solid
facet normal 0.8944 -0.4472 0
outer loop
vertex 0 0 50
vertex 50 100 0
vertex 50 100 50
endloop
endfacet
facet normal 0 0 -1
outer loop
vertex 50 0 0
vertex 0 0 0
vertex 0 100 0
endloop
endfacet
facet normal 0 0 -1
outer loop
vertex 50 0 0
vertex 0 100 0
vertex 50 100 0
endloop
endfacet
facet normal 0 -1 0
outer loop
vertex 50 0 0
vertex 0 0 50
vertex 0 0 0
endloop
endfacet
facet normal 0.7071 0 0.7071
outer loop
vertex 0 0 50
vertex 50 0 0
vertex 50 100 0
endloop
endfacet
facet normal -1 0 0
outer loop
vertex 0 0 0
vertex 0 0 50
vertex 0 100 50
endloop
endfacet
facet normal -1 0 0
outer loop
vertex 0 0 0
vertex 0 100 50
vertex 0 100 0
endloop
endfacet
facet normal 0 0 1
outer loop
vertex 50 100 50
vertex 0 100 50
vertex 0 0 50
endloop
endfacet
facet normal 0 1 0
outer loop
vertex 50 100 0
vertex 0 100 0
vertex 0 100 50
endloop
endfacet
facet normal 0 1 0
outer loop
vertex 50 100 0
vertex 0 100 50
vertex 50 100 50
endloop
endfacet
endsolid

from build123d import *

# Parameters (mm, degrees)
F1_DEPTH = 100
F3_DEPTH = 50


with BuildPart() as f1:
    # F0 (on Front) → F1 (new body)
    with BuildSketch(Plane.XZ):
        Polygon((0, 50), (0, 0), (50, 0), align=None)
    extrude(amount=-F1_DEPTH)

    # F2 (on face) → F3 (join, through all)
    with BuildSketch(Plane(origin=(0, 0, 0), x_dir=(1, 0, 0), z_dir=(0, 0, -1))):
        Polygon((50, -100), (0, 0), (0, -100), align=None)
    extrude(amount=-F3_DEPTH)


solid = f1.part
